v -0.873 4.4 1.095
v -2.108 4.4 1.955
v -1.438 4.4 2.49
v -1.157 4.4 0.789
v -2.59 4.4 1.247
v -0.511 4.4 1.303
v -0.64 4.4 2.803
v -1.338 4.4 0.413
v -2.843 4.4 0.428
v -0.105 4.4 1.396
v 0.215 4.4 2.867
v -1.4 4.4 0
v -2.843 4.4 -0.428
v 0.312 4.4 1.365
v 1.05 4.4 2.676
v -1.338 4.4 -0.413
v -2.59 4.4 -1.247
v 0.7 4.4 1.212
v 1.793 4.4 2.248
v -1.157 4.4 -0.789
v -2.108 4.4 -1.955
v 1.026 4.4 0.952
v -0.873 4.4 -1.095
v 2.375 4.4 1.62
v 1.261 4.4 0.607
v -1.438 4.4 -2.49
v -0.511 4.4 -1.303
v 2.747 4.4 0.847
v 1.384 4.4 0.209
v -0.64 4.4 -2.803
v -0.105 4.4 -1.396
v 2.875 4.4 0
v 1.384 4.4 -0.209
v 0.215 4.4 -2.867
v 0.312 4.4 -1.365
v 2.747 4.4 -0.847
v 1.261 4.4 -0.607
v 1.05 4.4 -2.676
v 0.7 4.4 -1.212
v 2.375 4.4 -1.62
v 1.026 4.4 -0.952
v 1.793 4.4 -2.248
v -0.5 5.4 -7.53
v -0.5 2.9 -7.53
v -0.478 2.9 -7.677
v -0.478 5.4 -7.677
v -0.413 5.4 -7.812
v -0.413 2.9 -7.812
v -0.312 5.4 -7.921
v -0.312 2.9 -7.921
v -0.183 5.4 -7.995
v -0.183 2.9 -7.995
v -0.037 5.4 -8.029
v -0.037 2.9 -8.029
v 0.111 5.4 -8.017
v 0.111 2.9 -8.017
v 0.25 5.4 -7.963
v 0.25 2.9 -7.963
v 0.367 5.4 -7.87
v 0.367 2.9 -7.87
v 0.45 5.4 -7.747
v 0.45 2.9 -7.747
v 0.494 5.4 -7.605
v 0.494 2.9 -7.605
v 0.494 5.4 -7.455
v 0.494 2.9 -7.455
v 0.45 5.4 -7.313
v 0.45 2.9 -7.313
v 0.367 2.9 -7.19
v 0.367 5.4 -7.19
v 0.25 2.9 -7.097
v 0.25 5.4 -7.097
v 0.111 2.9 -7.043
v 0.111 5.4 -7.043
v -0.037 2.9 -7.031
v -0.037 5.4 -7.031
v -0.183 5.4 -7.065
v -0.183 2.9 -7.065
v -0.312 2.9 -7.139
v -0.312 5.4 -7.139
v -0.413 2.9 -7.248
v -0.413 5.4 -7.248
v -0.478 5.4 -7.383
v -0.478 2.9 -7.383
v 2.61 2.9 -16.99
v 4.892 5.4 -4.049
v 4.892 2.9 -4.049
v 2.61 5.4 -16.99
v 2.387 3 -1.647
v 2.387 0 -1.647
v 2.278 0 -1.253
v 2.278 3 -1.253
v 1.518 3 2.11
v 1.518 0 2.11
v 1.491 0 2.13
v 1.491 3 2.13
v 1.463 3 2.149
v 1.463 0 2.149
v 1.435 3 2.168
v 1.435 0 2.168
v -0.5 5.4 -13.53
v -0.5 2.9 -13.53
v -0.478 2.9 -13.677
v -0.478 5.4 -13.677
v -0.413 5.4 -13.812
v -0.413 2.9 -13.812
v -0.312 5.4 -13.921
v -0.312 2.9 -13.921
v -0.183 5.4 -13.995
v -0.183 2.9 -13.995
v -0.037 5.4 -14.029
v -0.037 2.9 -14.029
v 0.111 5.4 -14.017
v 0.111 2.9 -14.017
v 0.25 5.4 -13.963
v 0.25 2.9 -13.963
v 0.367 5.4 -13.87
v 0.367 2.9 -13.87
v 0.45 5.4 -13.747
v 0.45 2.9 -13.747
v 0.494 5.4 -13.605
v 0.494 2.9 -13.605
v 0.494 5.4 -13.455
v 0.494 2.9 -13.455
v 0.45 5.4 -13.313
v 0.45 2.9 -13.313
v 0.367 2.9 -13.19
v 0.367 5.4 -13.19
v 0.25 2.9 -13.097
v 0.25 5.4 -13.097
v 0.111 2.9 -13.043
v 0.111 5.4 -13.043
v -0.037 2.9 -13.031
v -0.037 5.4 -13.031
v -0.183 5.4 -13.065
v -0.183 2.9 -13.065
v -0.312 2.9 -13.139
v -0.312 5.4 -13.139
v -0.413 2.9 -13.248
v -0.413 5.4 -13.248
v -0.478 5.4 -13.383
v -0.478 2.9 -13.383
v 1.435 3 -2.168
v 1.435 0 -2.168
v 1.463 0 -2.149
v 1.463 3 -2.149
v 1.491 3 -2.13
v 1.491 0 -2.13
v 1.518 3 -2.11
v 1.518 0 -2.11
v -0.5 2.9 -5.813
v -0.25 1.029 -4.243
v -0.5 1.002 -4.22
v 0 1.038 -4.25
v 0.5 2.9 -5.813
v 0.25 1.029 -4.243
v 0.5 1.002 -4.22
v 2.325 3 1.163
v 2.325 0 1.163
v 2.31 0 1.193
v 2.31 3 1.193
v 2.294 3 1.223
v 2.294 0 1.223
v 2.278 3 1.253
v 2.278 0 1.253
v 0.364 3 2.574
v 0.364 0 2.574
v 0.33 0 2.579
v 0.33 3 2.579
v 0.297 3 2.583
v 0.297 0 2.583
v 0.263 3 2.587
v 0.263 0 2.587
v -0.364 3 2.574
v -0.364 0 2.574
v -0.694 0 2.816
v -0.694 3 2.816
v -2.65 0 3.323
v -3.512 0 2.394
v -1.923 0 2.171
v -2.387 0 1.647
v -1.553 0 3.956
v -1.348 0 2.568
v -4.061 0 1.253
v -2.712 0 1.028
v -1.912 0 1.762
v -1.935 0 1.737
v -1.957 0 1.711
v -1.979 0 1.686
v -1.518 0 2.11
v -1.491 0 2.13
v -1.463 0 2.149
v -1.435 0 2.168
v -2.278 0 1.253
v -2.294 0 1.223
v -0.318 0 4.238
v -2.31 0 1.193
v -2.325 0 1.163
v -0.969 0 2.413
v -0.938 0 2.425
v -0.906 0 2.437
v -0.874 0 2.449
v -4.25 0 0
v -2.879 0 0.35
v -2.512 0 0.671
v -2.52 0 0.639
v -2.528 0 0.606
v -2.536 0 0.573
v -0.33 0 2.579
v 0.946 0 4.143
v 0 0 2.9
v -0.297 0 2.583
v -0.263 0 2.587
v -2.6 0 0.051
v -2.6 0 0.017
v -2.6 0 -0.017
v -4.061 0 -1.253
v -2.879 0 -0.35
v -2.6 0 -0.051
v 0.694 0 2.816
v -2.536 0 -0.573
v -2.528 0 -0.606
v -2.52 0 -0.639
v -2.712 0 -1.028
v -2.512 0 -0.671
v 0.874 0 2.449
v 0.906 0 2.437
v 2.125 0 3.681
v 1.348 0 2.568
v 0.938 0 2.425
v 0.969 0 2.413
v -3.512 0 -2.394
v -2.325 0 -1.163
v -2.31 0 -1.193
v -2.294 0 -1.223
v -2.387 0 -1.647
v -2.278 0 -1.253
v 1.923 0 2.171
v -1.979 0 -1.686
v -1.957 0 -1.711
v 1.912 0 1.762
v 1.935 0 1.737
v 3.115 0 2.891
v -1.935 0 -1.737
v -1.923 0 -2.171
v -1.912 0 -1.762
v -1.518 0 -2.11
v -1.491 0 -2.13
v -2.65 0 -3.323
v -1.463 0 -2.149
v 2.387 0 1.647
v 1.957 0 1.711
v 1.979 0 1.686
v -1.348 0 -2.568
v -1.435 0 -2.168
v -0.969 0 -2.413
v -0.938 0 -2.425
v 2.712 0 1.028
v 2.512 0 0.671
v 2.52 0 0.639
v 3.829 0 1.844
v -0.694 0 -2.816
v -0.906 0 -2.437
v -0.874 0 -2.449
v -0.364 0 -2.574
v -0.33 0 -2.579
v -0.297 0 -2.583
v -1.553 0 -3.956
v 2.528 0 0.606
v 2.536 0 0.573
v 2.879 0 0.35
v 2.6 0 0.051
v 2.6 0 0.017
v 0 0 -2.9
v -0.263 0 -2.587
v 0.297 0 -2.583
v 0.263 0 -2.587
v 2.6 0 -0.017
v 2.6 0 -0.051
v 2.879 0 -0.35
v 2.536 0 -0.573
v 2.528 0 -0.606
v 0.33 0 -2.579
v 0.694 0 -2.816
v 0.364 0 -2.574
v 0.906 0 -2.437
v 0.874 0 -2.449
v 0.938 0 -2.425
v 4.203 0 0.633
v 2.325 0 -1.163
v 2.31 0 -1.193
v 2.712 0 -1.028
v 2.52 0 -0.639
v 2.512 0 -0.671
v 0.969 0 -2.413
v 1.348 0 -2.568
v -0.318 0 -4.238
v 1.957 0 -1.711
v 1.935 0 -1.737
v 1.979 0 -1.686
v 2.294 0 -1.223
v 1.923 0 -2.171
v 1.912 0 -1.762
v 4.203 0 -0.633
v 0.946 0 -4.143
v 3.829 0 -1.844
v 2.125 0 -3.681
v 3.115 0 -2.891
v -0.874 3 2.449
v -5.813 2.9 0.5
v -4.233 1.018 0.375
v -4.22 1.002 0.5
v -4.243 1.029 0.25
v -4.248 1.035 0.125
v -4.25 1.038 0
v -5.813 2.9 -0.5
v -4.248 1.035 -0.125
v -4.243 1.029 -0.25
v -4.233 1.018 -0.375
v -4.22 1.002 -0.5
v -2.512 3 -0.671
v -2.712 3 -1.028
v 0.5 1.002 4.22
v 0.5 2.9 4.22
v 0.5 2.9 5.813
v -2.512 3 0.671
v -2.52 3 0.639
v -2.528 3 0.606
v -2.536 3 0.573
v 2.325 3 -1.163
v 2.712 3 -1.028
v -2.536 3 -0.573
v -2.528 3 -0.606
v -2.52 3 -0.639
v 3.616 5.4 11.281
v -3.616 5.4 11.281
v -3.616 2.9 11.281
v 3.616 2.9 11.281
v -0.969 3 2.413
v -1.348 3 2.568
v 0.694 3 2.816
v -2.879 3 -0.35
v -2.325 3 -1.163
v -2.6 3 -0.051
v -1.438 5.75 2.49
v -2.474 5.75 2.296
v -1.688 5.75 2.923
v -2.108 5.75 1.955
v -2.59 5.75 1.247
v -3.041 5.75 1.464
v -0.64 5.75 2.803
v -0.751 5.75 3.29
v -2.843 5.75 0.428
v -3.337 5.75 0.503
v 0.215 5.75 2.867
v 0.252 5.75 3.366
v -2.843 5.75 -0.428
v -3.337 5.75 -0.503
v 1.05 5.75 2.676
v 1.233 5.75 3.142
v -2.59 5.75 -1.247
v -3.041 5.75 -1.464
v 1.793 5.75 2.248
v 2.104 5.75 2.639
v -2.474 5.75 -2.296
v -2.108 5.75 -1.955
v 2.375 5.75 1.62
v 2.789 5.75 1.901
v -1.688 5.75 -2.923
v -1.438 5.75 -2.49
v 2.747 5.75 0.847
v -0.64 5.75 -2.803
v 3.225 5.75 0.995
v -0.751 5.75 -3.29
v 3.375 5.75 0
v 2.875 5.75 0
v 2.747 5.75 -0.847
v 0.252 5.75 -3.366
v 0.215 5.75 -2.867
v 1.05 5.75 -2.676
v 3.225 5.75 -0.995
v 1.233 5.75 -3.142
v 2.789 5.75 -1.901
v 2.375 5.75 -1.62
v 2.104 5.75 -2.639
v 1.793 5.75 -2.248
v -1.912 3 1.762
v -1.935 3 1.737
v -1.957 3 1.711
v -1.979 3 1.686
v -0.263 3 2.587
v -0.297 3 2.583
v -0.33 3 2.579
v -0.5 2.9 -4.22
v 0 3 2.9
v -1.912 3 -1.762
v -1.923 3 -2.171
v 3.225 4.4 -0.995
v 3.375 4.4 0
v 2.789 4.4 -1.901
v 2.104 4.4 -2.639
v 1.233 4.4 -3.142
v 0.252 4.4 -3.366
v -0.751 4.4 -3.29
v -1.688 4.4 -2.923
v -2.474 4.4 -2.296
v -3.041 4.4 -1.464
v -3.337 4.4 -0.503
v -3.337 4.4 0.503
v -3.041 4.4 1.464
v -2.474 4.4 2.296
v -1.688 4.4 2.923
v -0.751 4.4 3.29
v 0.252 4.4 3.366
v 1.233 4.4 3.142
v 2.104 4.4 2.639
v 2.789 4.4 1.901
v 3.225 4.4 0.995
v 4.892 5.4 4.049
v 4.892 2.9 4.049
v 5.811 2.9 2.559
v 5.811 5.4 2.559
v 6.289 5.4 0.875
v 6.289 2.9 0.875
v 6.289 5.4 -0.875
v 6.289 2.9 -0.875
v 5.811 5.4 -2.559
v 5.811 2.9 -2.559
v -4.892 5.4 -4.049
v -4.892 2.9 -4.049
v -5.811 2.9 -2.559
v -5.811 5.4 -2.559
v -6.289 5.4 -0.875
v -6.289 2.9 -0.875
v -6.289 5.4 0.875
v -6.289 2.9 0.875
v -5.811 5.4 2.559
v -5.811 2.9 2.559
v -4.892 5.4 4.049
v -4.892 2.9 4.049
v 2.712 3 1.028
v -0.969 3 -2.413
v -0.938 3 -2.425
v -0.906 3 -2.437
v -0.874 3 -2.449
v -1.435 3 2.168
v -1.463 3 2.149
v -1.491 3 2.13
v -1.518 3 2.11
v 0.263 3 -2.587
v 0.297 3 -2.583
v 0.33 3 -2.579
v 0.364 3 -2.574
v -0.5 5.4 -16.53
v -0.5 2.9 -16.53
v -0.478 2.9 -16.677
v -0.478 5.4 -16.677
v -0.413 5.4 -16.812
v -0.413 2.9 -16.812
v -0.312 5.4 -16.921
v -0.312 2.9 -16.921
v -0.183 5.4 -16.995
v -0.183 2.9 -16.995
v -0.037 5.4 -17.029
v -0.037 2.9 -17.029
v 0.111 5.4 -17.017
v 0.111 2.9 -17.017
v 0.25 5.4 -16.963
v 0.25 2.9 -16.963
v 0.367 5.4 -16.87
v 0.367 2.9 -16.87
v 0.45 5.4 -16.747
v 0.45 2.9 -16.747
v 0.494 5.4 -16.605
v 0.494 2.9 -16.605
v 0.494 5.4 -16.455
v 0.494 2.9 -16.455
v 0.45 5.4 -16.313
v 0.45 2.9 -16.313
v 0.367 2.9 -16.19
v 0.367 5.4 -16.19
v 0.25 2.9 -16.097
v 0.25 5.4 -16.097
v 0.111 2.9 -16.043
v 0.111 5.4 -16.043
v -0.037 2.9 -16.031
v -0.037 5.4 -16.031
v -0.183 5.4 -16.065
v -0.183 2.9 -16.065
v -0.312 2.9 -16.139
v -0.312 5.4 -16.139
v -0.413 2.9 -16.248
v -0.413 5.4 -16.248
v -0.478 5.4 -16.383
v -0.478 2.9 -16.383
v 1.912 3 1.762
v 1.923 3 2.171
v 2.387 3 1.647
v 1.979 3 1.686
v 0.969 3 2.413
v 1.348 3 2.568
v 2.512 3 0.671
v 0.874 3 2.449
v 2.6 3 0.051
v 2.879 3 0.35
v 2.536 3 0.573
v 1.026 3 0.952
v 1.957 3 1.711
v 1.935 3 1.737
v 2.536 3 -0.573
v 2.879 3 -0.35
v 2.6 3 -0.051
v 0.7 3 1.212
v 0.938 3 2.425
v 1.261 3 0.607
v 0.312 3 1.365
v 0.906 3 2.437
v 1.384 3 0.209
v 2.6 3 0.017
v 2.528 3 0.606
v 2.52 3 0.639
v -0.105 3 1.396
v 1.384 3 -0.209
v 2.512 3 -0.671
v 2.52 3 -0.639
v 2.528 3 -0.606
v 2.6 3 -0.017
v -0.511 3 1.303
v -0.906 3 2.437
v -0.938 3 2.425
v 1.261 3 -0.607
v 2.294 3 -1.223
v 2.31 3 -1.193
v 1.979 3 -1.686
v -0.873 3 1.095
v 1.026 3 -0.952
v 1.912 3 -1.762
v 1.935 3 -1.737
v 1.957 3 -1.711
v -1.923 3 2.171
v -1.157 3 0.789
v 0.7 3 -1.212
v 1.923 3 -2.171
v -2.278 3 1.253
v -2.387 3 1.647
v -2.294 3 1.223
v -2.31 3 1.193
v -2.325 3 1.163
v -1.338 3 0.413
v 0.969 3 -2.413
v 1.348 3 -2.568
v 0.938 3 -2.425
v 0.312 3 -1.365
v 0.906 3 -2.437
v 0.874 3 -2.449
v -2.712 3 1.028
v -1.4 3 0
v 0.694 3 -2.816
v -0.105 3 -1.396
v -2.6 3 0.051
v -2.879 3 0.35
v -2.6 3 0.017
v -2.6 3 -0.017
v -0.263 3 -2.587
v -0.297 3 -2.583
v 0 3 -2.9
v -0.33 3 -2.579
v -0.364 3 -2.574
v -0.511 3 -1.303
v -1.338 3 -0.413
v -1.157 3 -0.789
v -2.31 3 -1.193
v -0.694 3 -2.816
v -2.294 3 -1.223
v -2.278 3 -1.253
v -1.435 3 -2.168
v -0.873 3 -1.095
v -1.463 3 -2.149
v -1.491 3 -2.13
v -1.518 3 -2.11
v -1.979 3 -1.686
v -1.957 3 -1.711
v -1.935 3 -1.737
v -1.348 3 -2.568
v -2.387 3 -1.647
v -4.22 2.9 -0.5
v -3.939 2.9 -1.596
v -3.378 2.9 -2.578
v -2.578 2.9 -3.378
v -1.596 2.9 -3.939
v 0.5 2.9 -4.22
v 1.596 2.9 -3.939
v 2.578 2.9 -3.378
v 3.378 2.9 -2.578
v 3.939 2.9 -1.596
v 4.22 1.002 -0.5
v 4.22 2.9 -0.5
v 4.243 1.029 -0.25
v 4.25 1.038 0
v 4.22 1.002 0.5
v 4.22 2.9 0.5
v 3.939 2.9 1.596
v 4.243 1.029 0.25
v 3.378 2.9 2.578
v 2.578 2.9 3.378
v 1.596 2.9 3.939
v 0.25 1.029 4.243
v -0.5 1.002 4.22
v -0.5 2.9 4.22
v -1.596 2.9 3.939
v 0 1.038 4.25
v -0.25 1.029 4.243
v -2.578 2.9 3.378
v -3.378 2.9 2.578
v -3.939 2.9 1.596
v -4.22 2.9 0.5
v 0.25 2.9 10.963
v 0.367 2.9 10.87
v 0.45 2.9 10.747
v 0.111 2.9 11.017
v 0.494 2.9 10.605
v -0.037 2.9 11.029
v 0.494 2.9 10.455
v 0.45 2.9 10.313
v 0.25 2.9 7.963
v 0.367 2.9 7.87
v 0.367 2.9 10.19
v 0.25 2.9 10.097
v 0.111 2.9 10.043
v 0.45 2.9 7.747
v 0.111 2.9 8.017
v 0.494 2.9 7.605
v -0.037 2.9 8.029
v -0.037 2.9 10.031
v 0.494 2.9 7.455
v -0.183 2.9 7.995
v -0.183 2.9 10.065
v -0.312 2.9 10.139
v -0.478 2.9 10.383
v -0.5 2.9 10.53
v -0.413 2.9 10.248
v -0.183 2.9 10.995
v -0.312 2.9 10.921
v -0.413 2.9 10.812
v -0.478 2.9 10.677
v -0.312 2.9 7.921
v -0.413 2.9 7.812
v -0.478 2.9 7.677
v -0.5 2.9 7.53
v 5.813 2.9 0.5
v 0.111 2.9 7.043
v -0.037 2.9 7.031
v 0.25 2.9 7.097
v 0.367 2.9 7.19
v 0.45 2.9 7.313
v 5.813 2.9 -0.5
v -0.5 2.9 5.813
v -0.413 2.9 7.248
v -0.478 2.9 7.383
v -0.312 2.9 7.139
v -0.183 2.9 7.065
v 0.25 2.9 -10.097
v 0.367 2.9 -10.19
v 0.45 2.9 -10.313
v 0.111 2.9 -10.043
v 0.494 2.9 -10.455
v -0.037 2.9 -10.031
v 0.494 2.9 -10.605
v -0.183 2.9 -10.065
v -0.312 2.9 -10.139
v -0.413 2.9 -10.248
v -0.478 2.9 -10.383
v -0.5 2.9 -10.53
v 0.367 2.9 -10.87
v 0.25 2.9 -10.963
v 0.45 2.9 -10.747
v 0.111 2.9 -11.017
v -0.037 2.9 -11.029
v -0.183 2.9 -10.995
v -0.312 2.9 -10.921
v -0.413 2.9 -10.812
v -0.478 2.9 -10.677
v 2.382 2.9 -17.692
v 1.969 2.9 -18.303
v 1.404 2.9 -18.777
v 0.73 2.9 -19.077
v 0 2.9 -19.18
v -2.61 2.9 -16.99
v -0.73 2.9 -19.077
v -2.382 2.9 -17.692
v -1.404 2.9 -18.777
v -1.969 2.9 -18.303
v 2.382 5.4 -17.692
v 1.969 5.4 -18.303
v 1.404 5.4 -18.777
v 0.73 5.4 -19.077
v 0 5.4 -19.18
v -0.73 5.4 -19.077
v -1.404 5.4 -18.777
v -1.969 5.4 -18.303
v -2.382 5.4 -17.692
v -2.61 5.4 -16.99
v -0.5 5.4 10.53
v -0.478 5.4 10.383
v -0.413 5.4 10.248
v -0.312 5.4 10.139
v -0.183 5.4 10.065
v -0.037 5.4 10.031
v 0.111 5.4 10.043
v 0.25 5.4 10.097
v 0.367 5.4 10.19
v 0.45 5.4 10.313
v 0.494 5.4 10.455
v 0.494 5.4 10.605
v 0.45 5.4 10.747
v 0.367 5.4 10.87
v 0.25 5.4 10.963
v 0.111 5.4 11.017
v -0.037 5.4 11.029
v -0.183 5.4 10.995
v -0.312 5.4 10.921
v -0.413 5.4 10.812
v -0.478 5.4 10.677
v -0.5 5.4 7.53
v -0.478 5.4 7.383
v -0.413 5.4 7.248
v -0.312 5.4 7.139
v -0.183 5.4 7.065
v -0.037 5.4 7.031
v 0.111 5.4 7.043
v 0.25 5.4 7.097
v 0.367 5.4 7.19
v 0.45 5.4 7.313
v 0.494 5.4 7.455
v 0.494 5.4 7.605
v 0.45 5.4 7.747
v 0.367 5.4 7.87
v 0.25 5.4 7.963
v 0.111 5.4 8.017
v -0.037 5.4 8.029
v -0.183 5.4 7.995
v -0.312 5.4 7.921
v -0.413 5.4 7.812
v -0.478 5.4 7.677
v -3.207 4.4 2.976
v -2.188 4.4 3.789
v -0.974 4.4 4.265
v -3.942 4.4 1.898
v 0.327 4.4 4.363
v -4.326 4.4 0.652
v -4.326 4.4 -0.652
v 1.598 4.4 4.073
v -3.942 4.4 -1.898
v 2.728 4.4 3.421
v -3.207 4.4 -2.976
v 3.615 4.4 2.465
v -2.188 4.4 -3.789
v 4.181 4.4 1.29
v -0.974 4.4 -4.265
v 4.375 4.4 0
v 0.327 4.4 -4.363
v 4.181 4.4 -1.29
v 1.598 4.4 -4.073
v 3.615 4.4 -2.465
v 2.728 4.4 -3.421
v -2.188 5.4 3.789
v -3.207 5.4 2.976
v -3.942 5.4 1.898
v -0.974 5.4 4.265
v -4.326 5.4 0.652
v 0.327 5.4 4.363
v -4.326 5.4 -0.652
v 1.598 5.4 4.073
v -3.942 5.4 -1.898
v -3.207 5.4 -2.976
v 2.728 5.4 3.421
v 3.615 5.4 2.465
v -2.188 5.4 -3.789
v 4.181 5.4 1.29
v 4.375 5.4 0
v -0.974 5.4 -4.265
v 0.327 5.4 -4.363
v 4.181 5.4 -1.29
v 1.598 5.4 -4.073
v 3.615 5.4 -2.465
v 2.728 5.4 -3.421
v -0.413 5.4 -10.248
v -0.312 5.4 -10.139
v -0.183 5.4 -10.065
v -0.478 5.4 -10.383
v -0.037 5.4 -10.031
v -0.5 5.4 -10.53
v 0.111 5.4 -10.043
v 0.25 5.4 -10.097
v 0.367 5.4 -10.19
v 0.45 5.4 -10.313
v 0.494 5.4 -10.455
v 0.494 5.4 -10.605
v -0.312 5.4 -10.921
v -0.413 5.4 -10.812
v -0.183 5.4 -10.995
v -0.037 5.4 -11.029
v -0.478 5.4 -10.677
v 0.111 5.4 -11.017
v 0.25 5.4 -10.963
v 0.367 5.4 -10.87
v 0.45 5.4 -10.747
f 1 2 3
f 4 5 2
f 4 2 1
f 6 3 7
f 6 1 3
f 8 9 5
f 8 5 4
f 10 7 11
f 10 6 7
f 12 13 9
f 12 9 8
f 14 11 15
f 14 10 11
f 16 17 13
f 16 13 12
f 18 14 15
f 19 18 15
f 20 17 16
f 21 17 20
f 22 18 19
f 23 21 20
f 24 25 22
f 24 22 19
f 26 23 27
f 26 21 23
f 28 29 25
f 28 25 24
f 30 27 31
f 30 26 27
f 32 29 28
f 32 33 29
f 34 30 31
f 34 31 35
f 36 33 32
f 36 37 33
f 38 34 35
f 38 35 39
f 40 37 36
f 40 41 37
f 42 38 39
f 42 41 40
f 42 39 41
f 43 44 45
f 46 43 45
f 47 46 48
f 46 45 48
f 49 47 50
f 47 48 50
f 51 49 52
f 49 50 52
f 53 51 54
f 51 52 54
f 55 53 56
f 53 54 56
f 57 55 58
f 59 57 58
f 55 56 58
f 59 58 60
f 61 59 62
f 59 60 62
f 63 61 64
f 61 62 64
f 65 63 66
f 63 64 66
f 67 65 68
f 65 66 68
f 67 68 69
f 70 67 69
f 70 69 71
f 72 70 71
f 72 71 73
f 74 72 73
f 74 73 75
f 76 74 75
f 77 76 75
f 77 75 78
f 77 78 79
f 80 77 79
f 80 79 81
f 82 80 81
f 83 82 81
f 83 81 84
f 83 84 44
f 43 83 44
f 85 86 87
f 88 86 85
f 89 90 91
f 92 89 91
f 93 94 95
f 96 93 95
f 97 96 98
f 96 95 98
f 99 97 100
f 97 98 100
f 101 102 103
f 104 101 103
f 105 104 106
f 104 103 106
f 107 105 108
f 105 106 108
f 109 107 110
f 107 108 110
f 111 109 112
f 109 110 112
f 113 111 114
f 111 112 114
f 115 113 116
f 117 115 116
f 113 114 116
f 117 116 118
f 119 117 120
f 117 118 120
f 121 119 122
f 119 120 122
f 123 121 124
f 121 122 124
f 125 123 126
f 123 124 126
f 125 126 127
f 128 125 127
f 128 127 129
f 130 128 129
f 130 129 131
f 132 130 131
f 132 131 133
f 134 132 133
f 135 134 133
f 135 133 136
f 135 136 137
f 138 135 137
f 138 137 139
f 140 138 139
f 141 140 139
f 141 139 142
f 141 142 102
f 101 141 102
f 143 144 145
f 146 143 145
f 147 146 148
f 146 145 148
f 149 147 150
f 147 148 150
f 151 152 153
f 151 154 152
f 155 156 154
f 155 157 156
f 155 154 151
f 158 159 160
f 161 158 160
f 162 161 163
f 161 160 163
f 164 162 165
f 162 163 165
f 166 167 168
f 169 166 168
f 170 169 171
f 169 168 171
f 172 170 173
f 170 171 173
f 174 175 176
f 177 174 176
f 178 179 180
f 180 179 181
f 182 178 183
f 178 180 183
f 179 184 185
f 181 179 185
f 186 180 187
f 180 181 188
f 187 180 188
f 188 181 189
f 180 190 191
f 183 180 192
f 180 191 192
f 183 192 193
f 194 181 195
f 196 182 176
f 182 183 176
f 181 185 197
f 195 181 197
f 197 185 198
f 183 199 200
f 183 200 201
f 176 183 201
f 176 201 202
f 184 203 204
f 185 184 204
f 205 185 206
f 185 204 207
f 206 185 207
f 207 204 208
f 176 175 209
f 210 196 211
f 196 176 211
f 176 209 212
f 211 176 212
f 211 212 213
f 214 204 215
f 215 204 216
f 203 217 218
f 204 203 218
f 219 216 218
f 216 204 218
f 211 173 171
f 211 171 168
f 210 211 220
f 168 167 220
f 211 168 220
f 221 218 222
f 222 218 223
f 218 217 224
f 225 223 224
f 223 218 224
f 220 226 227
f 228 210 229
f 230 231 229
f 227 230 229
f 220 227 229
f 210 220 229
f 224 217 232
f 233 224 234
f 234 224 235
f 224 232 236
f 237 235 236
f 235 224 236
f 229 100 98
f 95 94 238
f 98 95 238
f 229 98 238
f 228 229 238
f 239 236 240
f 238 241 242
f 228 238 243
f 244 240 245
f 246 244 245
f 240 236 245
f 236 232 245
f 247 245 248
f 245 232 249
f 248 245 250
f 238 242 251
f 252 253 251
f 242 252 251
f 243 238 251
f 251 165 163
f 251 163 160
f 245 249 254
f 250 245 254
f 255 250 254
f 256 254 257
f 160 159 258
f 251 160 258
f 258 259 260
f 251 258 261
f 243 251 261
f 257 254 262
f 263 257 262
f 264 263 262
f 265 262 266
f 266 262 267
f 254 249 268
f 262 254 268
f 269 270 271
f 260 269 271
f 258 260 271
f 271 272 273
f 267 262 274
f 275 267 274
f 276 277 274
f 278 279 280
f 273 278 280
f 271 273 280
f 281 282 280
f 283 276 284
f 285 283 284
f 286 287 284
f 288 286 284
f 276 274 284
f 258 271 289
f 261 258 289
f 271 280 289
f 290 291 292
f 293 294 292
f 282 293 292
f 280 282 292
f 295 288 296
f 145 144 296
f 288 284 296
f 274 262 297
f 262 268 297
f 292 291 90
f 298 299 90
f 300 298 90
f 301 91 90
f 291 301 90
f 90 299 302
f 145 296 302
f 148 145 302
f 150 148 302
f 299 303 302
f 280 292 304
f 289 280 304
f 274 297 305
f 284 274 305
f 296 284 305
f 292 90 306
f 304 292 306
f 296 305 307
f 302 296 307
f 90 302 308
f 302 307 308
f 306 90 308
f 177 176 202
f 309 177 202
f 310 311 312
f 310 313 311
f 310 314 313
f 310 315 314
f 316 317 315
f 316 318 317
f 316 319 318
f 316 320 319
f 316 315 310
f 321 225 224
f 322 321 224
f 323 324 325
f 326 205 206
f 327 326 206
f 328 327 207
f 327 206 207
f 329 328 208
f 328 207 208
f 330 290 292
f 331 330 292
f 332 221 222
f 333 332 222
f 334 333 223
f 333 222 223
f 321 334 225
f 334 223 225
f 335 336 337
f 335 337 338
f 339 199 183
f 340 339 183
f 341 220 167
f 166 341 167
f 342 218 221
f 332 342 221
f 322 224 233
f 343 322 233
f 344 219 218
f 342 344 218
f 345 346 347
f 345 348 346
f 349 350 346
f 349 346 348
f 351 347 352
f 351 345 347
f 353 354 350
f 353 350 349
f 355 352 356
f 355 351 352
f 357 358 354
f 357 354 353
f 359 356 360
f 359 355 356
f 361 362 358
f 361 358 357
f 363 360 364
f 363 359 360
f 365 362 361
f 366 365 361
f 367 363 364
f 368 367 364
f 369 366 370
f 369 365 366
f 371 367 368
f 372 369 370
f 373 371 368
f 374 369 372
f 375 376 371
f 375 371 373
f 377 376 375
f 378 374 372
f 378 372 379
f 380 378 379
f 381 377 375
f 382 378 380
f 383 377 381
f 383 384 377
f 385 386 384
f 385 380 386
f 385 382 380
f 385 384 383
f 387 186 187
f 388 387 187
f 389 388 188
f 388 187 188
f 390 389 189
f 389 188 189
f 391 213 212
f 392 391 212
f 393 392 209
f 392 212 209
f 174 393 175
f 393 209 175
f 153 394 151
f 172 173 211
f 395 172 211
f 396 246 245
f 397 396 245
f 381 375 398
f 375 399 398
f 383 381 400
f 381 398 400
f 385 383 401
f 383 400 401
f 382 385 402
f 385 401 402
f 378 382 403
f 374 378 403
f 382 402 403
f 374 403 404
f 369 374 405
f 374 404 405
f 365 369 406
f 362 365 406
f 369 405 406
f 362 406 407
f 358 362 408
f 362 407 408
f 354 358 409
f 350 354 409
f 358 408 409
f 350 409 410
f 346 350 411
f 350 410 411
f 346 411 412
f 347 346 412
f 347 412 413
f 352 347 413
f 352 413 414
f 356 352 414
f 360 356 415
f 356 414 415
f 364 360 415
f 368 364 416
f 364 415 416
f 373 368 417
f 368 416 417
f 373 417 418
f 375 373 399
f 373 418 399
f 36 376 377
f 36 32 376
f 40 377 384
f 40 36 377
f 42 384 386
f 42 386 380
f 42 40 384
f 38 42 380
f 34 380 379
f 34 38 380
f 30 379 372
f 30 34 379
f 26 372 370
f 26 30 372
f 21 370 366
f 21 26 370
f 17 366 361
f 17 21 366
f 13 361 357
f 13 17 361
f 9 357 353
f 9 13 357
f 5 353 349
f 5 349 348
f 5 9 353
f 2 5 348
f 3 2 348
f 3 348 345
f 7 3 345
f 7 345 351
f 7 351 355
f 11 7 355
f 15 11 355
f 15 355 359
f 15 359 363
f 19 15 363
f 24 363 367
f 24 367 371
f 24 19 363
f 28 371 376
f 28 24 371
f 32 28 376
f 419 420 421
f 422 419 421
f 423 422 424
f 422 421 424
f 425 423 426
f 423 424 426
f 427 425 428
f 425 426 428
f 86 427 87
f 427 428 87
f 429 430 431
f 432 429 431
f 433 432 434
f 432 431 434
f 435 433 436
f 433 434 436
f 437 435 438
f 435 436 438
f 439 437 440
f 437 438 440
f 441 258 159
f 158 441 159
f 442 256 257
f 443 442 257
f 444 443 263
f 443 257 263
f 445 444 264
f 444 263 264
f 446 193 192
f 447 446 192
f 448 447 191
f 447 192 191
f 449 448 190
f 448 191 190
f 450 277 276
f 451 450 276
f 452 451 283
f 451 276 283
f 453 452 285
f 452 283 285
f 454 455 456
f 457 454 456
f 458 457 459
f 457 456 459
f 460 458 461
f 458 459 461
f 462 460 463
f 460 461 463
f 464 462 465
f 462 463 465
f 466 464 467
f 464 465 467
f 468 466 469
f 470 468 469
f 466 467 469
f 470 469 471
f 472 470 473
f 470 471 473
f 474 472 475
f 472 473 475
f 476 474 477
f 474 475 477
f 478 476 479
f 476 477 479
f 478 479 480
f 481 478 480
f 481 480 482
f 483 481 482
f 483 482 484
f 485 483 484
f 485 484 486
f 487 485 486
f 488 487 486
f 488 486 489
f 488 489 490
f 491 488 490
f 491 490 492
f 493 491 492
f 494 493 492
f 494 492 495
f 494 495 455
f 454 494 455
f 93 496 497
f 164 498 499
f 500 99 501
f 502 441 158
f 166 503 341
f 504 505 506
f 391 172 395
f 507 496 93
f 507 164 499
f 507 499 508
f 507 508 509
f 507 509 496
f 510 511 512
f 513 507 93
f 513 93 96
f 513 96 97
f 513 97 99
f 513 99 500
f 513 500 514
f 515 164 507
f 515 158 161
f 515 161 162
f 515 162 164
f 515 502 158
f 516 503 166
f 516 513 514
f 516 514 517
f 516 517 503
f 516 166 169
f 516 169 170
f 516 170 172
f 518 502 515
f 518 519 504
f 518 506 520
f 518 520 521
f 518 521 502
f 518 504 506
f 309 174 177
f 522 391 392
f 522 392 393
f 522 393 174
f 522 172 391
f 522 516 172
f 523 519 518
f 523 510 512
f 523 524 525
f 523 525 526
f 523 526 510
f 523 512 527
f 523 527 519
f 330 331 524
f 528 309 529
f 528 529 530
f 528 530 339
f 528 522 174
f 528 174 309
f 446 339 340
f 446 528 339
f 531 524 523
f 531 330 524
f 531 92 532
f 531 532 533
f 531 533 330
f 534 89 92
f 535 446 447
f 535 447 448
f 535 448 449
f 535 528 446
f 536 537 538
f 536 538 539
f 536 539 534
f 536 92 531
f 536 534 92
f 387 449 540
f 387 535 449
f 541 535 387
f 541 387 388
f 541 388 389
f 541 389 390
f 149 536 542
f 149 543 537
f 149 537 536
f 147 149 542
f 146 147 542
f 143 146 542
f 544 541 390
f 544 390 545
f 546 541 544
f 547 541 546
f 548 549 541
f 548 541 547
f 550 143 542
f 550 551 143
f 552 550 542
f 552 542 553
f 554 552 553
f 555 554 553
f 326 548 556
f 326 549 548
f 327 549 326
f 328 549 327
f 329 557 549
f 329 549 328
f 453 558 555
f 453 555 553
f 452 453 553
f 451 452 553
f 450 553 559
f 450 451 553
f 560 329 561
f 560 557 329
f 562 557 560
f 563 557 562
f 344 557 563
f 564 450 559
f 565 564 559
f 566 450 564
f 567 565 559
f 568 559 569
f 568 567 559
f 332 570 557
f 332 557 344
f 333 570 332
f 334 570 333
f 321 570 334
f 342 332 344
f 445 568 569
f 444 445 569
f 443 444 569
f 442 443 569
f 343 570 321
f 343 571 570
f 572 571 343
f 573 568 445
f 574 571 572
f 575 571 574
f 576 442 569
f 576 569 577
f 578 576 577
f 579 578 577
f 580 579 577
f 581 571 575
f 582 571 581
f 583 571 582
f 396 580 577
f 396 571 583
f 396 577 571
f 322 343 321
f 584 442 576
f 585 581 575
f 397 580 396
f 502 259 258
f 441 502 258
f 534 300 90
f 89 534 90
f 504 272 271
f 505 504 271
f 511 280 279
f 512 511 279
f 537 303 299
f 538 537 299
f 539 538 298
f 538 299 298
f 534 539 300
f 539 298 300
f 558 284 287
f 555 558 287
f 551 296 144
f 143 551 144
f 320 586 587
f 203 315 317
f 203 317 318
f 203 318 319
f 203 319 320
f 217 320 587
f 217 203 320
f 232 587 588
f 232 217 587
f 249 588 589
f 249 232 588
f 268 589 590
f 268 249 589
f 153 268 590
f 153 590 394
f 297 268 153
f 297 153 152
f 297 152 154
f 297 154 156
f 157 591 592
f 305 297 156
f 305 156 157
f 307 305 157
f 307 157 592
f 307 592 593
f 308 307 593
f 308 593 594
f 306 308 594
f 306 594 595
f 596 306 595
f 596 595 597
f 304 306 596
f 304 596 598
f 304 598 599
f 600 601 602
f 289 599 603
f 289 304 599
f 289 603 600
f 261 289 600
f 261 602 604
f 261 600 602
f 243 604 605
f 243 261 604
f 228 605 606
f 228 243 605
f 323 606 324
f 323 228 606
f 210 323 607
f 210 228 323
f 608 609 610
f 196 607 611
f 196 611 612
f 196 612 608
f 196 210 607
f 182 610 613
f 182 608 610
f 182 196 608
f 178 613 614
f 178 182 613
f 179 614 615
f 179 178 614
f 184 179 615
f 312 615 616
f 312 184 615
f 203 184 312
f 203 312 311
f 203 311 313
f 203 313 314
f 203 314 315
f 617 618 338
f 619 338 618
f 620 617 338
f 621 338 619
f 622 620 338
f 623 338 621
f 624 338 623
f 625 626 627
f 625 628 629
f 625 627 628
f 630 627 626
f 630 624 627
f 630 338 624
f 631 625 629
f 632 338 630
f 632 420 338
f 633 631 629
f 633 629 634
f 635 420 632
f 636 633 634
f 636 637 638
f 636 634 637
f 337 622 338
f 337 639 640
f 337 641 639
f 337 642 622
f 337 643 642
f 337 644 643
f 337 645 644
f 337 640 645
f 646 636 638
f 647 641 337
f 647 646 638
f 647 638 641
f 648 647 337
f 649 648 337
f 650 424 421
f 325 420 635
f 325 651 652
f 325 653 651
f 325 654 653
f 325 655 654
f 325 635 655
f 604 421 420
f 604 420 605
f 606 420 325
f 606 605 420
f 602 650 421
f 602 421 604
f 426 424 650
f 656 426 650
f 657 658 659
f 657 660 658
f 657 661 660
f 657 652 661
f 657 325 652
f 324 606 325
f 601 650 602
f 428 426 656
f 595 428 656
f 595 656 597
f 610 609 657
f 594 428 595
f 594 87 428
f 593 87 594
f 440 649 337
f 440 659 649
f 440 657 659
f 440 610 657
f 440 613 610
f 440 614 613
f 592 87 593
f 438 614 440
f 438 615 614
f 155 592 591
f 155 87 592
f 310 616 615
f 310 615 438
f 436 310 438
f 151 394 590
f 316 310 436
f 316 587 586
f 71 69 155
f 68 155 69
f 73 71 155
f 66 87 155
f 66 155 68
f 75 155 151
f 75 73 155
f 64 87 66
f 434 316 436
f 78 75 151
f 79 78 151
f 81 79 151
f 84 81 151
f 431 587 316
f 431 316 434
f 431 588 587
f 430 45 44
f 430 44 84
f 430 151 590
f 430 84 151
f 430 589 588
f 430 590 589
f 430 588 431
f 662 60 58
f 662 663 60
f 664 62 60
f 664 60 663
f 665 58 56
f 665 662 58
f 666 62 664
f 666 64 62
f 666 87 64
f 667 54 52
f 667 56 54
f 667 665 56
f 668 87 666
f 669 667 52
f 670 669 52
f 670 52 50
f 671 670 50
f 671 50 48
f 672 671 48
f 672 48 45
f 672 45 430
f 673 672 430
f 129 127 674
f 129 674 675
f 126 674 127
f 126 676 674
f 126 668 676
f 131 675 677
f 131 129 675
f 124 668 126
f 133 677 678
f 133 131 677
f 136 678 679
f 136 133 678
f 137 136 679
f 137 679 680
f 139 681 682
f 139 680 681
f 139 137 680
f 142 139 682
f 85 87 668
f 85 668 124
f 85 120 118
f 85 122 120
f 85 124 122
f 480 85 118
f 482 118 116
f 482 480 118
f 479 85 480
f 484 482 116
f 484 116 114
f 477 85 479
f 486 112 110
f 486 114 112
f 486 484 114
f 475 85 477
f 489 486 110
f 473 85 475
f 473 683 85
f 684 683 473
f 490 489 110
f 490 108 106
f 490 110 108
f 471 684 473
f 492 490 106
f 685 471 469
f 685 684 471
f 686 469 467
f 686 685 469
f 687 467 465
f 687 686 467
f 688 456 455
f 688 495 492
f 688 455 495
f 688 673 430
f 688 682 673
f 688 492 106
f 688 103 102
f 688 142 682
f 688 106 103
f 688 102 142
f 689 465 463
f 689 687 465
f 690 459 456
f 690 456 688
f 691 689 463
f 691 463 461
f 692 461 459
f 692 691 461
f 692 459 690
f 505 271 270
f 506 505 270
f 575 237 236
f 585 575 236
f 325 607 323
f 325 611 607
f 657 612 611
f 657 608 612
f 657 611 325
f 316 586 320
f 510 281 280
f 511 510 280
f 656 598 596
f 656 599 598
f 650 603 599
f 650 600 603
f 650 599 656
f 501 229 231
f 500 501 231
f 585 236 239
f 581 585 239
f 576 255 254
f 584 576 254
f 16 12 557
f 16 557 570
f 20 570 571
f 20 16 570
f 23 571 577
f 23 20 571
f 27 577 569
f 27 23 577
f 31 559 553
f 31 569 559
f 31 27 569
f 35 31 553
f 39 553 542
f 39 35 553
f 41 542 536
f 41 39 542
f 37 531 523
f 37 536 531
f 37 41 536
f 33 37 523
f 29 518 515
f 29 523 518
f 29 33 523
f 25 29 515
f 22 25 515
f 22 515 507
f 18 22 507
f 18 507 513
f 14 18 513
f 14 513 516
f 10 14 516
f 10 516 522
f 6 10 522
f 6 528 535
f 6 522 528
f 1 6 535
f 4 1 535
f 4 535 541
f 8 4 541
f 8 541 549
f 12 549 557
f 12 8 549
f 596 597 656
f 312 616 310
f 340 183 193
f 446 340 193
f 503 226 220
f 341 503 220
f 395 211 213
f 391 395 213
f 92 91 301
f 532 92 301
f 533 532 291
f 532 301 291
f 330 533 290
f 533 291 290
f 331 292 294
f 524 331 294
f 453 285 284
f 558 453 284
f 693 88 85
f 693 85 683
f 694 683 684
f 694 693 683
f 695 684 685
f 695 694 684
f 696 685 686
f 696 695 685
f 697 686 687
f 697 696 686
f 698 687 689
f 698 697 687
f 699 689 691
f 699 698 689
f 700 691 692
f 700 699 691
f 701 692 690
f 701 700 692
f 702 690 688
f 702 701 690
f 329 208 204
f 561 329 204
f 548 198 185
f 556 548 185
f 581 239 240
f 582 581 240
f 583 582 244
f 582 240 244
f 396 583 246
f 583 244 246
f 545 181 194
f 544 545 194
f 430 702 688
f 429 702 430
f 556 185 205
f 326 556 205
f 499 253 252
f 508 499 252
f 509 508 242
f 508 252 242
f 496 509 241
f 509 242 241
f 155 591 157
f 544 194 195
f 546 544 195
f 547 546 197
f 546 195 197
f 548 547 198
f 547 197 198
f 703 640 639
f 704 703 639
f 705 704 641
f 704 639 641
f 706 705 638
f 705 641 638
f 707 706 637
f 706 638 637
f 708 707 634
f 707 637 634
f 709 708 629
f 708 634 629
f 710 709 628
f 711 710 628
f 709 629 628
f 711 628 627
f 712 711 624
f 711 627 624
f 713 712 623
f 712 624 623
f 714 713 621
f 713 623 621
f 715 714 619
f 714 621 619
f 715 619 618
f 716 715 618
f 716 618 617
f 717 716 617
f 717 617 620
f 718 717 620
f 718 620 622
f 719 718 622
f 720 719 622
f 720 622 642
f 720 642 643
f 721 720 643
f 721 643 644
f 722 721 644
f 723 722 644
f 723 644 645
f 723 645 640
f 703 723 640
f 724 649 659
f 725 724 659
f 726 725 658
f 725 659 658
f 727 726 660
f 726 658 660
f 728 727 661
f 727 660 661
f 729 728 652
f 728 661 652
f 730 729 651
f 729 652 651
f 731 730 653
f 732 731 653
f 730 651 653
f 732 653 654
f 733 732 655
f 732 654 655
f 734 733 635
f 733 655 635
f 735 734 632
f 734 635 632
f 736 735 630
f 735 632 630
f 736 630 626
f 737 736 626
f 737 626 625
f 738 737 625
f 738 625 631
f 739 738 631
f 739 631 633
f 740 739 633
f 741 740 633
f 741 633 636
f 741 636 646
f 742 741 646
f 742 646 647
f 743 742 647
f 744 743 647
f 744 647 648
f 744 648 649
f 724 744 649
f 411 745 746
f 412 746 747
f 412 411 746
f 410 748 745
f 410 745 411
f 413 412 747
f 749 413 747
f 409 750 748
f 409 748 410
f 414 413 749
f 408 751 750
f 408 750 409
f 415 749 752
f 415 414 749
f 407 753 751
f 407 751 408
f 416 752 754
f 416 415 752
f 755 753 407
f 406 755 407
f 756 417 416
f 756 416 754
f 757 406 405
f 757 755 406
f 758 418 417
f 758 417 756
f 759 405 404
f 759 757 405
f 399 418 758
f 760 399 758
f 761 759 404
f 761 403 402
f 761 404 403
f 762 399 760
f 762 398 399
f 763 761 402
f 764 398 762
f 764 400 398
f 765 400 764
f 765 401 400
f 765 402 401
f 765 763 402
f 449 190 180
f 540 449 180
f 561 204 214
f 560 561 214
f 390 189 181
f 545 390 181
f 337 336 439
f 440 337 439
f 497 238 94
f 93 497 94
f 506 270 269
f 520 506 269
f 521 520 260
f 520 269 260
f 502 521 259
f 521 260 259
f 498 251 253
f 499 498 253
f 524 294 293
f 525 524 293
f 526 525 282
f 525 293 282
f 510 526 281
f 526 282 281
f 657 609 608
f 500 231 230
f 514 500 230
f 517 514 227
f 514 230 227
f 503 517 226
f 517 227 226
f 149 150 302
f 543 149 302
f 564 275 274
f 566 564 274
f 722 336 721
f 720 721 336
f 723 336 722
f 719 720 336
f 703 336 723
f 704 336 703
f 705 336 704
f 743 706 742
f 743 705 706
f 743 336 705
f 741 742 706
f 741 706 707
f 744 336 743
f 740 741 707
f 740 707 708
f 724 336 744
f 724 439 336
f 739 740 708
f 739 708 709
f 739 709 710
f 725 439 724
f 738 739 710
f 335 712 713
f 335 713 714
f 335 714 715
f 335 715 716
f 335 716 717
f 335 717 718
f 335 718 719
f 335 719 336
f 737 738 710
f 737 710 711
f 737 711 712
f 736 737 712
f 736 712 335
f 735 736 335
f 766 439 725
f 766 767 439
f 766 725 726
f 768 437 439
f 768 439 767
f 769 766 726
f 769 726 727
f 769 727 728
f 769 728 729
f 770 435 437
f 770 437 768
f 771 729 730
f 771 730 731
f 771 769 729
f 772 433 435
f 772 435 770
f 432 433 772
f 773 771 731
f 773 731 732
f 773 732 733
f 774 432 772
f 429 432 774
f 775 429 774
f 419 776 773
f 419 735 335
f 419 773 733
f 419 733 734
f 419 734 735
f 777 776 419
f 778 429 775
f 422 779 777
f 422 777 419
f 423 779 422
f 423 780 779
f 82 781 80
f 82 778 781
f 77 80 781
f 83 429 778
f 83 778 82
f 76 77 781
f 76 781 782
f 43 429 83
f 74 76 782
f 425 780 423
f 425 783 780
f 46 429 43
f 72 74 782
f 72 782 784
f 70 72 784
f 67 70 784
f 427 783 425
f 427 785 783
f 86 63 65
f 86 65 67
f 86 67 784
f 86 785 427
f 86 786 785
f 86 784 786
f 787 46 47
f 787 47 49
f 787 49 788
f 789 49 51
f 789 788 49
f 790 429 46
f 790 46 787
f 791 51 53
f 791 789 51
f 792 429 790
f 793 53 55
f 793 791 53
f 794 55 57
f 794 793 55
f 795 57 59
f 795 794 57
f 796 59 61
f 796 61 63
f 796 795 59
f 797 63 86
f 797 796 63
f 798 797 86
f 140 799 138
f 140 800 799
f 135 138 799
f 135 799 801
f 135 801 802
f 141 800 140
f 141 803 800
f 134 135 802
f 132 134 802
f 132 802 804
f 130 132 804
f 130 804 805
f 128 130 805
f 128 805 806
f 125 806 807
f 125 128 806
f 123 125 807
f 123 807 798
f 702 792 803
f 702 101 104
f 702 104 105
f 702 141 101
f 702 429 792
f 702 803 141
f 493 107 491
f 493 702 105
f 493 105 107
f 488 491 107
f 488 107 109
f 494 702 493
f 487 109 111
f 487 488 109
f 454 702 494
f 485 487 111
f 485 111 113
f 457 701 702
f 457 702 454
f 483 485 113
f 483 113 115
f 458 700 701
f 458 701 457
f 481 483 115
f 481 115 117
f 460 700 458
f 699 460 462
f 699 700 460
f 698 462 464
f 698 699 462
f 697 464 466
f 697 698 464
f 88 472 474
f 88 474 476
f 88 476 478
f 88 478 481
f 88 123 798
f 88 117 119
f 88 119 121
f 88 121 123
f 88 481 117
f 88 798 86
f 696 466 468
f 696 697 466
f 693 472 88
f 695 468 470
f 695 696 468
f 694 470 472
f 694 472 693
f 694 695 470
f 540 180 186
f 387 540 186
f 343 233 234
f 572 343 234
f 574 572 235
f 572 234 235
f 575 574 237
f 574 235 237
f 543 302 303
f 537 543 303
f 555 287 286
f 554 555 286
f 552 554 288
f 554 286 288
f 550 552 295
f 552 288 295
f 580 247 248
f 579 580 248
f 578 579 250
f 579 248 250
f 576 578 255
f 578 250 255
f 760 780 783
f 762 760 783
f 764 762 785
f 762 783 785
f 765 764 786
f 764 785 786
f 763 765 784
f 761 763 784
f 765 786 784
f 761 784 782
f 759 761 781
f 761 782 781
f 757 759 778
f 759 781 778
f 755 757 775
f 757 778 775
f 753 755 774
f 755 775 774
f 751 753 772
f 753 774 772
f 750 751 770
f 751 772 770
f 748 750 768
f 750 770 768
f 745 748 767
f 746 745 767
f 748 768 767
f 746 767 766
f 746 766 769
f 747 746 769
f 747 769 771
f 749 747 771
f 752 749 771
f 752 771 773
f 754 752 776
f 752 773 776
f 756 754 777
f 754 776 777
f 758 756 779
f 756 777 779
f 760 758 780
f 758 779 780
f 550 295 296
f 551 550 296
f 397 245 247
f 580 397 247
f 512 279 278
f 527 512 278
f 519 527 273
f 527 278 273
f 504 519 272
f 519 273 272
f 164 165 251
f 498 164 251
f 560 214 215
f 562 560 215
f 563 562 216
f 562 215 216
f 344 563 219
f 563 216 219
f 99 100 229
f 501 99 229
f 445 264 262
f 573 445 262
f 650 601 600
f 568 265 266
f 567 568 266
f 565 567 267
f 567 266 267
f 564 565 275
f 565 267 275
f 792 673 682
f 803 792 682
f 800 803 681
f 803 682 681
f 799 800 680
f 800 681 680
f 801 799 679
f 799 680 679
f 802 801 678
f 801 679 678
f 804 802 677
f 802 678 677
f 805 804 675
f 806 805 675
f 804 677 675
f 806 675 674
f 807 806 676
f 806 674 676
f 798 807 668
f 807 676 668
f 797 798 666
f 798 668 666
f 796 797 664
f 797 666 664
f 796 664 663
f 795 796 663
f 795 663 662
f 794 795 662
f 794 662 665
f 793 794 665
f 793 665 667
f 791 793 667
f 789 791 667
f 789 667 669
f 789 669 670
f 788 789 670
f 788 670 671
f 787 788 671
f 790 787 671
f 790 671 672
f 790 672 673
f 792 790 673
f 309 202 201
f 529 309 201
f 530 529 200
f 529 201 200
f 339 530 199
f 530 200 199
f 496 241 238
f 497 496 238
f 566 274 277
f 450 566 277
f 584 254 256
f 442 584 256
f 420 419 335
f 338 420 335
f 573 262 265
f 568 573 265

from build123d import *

# Parameters (mm, degrees)
SKETCH1_R               = 6.35
BOSS_EXTRUDE1_DEPTH     = 5.4
HORN_DEPTH              = 2.5
SKETCH4_R               = 1.4
CUT_EXTRUDE1_DEPTH      = 6.4
SKETCH5_R               = 0.5
CUT_EXTRUDE2_DEPTH      = 6.4
LPATTERN1_COUNT         = 4
LPATTERN1_PITCH         = 3
MIRROR1_COPY_1_SKETCH_R = 0.5
MIRROR1_COPY_1_DEPTH    = 6.4
MIRROR1_COPY_2_SKETCH_R = 0.5
MIRROR1_COPY_2_DEPTH    = 6.4
MIRROR1_COPY_3_SKETCH_R = 0.5
MIRROR1_COPY_3_DEPTH    = 6.4
CUT_EXTRUDE4_DEPTH      = 3
CIRPATTERN2_COUNT       = 26
SKETCH9_R               = 2.6
CUT_EXTRUDE5_DEPTH      = 3
SKETCH10_R              = 6.35
SKETCH10_R_2            = 4.25
CUT_EXTRUDE6_DEPTH      = 2.9
BOSS_EXTRUDE5_DEPTH     = 0.5
CIRPATTERN3_COUNT       = 4
SKETCH12_R              = 4.375
CUT_EXTRUDE7_DEPTH      = 1
SKETCH13_R              = 3.375
SKETCH13_R_2            = 2.875
BOSS_EXTRUDE6_DEPTH     = 1
SKETCH14_R              = 3.375
SKETCH14_R_2            = 2.875
BOSS_EXTRUDE7_DEPTH     = 0.35
CUT_EXTRUDE8_DEPTH      = 6.4


with BuildPart() as part:
    # Sketch1 → Boss-Extrude1 (new body)
    with BuildSketch(Plane(origin=(0, 0, 0), x_dir=(1, 0, 0), z_dir=(0, 1, 0))):
        Circle(SKETCH1_R)
    extrude(amount=BOSS_EXTRUDE1_DEPTH)

    # Sketch2 → horn (add)
    with BuildSketch(Plane(origin=(0, 5.4, 0), x_dir=(1, 0, 0), z_dir=(0, 1, 0))):
        with BuildLine():
            Line((-2.609740545, 16.990167671), (-4.891612682, 4.049027706))
            ThreePointArc((-4.891612682, 4.049027706), (0, 6.35), (4.891612682, 4.049027706))
            Line((4.891612682, 4.049027706), (2.609740545, 16.990167671))
            ThreePointArc((2.609740545, 16.990167671), (0, 19.18), (-2.609740545, 16.990167671))
        make_face()
    horn = extrude(amount=-HORN_DEPTH)

    # Sketch4 → Cut-Extrude1 (cut, through all)
    with BuildSketch(Plane(origin=(0, 5.4, 0), x_dir=(-1, 0, 0), z_dir=(0, -1, 0))):
        Circle(SKETCH4_R)
    extrude(amount=CUT_EXTRUDE1_DEPTH, mode=Mode.SUBTRACT)

    # Sketch5 → Cut-Extrude2 (cut, through all)
    with BuildSketch(Plane(origin=(0, 0, 0), x_dir=(-1, 0, 0), z_dir=(0, -1, 0))):
        with Locations((0, 16.53)):
            Circle(SKETCH5_R)
    cut_extrude2 = extrude(amount=-CUT_EXTRUDE2_DEPTH, mode=Mode.SUBTRACT)

    # LPattern1: Cut-Extrude2 ×4
    with Locations(*[(0, 0, i * LPATTERN1_PITCH) for i in range(1, LPATTERN1_COUNT)]):
        add(cut_extrude2, mode=Mode.SUBTRACT)

    # Mirror1: horn, Cut-Extrude2 across plane
    add(horn.mirror(Plane.XY))
    add(cut_extrude2.mirror(Plane.XY), mode=Mode.SUBTRACT)

    # Mirror1 copy 1 sketch → Mirror1 copy 1 (cut, through all)
    with BuildSketch(Plane(origin=(0, 0, -3), x_dir=(-1, 0, 0), z_dir=(0, -1, 0))):
        with Locations((0, -16.53)):
            Circle(MIRROR1_COPY_1_SKETCH_R)
    extrude(amount=-MIRROR1_COPY_1_DEPTH, mode=Mode.SUBTRACT)

    # Mirror1 copy 2 sketch → Mirror1 copy 2 (cut, through all)
    with BuildSketch(Plane(origin=(0, 0, -6), x_dir=(-1, 0, 0), z_dir=(0, -1, 0))):
        with Locations((0, -16.53)):
            Circle(MIRROR1_COPY_2_SKETCH_R)
    extrude(amount=-MIRROR1_COPY_2_DEPTH, mode=Mode.SUBTRACT)

    # Mirror1 copy 3 sketch → Mirror1 copy 3 (cut, through all)
    with BuildSketch(Plane(origin=(0, 0, -9), x_dir=(-1, 0, 0), z_dir=(0, -1, 0))):
        with Locations((0, -16.53)):
            Circle(MIRROR1_COPY_3_SKETCH_R)
    extrude(amount=-MIRROR1_COPY_3_DEPTH, mode=Mode.SUBTRACT)

    # Sketch8 → Cut-Extrude4 (cut)
    with BuildSketch(Plane(origin=(0, 0, 0), x_dir=(-1, 0, 0), z_dir=(0, -1, 0))):
        with BuildLine():
            Line((0, -2.9), (0.262912611, -2.586672952))
            ThreePointArc((0.262912611, -2.586672952), (0, -2.6), (-0.262912611, -2.586672952))
            Line((-0.262912611, -2.586672952), (0, -2.9))
        make_face()
    cut_extrude4 = extrude(amount=-CUT_EXTRUDE4_DEPTH, mode=Mode.SUBTRACT)

    # CirPattern2: Cut-Extrude4 ×26 about axis
    cirpattern2_axis = Axis((0, 0, 0), (0, 1, 0))
    for i in range(1, CIRPATTERN2_COUNT):
        add(cut_extrude4.rotate(cirpattern2_axis, i * 360 / CIRPATTERN2_COUNT), mode=Mode.SUBTRACT)

    # Sketch9 → Cut-Extrude5 (cut)
    with BuildSketch(Plane(origin=(0, 0, 0), x_dir=(-1, 0, 0), z_dir=(0, -1, 0))):
        Circle(SKETCH9_R)
    extrude(amount=-CUT_EXTRUDE5_DEPTH, mode=Mode.SUBTRACT)

    # Sketch10 → Cut-Extrude6 (cut)
    with BuildSketch(Plane(origin=(0, 0, 0), x_dir=(-1, 0, 0), z_dir=(0, -1, 0))):
        Circle(SKETCH10_R)
        Circle(SKETCH10_R_2, mode=Mode.SUBTRACT)
    extrude(amount=-CUT_EXTRUDE6_DEPTH, mode=Mode.SUBTRACT)

    # Sketch11 → Boss-Extrude5 (add, symmetric)
    with BuildSketch(Plane.XY):
        Polygon((4.21, 0.99), (5.812680296, 2.9), (4.21, 2.9), (4.16, 2.9), (4.16, 0.99), align=None)
    boss_extrude5 = extrude(amount=BOSS_EXTRUDE5_DEPTH, both=True)

    # CirPattern3: Boss-Extrude5 ×4 about axis
    cirpattern3_axis = Axis((0, 0, 0), (0, 1, 0))
    for i in range(1, CIRPATTERN3_COUNT):
        add(boss_extrude5.rotate(cirpattern3_axis, i * 360 / CIRPATTERN3_COUNT))

    # Sketch12 → Cut-Extrude7 (cut)
    with BuildSketch(Plane(origin=(0, 5.4, 0), x_dir=(1, 0, 0), z_dir=(0, 1, 0))):
        Circle(SKETCH12_R)
    extrude(amount=-CUT_EXTRUDE7_DEPTH, mode=Mode.SUBTRACT)

    # Sketch13 → Boss-Extrude6 (add)
    with BuildSketch(Plane(origin=(0, 4.4, 0), x_dir=(1, 0, 0), z_dir=(0, 1, 0))):
        Circle(SKETCH13_R)
        Circle(SKETCH13_R_2, mode=Mode.SUBTRACT)
    extrude(amount=BOSS_EXTRUDE6_DEPTH)

    # Sketch14 → Boss-Extrude7 (add)
    with BuildSketch(Plane(origin=(0, 5.4, 0), x_dir=(1, 0, 0), z_dir=(0, 1, 0))):
        Circle(SKETCH14_R)
        Circle(SKETCH14_R_2, mode=Mode.SUBTRACT)
    extrude(amount=BOSS_EXTRUDE7_DEPTH)

    # Sketch15 → Cut-Extrude8 (cut, through all)
    with BuildSketch(Plane(origin=(0, 5.4, 0), x_dir=(1, 0, 0), z_dir=(0, 1, 0))):
        Polygon((-3.616359732, -11.281346581), (3.616359732, -11.281346581), (9.32149419, -16.388605274), (4.660747095, -20.846711191), (-5.775273574, -20.846711191), (-10.680070262, -15.7189692), (-9.733647563, -14.813695314), align=None)
    extrude(amount=-CUT_EXTRUDE8_DEPTH, mode=Mode.SUBTRACT)


solid = part.part
